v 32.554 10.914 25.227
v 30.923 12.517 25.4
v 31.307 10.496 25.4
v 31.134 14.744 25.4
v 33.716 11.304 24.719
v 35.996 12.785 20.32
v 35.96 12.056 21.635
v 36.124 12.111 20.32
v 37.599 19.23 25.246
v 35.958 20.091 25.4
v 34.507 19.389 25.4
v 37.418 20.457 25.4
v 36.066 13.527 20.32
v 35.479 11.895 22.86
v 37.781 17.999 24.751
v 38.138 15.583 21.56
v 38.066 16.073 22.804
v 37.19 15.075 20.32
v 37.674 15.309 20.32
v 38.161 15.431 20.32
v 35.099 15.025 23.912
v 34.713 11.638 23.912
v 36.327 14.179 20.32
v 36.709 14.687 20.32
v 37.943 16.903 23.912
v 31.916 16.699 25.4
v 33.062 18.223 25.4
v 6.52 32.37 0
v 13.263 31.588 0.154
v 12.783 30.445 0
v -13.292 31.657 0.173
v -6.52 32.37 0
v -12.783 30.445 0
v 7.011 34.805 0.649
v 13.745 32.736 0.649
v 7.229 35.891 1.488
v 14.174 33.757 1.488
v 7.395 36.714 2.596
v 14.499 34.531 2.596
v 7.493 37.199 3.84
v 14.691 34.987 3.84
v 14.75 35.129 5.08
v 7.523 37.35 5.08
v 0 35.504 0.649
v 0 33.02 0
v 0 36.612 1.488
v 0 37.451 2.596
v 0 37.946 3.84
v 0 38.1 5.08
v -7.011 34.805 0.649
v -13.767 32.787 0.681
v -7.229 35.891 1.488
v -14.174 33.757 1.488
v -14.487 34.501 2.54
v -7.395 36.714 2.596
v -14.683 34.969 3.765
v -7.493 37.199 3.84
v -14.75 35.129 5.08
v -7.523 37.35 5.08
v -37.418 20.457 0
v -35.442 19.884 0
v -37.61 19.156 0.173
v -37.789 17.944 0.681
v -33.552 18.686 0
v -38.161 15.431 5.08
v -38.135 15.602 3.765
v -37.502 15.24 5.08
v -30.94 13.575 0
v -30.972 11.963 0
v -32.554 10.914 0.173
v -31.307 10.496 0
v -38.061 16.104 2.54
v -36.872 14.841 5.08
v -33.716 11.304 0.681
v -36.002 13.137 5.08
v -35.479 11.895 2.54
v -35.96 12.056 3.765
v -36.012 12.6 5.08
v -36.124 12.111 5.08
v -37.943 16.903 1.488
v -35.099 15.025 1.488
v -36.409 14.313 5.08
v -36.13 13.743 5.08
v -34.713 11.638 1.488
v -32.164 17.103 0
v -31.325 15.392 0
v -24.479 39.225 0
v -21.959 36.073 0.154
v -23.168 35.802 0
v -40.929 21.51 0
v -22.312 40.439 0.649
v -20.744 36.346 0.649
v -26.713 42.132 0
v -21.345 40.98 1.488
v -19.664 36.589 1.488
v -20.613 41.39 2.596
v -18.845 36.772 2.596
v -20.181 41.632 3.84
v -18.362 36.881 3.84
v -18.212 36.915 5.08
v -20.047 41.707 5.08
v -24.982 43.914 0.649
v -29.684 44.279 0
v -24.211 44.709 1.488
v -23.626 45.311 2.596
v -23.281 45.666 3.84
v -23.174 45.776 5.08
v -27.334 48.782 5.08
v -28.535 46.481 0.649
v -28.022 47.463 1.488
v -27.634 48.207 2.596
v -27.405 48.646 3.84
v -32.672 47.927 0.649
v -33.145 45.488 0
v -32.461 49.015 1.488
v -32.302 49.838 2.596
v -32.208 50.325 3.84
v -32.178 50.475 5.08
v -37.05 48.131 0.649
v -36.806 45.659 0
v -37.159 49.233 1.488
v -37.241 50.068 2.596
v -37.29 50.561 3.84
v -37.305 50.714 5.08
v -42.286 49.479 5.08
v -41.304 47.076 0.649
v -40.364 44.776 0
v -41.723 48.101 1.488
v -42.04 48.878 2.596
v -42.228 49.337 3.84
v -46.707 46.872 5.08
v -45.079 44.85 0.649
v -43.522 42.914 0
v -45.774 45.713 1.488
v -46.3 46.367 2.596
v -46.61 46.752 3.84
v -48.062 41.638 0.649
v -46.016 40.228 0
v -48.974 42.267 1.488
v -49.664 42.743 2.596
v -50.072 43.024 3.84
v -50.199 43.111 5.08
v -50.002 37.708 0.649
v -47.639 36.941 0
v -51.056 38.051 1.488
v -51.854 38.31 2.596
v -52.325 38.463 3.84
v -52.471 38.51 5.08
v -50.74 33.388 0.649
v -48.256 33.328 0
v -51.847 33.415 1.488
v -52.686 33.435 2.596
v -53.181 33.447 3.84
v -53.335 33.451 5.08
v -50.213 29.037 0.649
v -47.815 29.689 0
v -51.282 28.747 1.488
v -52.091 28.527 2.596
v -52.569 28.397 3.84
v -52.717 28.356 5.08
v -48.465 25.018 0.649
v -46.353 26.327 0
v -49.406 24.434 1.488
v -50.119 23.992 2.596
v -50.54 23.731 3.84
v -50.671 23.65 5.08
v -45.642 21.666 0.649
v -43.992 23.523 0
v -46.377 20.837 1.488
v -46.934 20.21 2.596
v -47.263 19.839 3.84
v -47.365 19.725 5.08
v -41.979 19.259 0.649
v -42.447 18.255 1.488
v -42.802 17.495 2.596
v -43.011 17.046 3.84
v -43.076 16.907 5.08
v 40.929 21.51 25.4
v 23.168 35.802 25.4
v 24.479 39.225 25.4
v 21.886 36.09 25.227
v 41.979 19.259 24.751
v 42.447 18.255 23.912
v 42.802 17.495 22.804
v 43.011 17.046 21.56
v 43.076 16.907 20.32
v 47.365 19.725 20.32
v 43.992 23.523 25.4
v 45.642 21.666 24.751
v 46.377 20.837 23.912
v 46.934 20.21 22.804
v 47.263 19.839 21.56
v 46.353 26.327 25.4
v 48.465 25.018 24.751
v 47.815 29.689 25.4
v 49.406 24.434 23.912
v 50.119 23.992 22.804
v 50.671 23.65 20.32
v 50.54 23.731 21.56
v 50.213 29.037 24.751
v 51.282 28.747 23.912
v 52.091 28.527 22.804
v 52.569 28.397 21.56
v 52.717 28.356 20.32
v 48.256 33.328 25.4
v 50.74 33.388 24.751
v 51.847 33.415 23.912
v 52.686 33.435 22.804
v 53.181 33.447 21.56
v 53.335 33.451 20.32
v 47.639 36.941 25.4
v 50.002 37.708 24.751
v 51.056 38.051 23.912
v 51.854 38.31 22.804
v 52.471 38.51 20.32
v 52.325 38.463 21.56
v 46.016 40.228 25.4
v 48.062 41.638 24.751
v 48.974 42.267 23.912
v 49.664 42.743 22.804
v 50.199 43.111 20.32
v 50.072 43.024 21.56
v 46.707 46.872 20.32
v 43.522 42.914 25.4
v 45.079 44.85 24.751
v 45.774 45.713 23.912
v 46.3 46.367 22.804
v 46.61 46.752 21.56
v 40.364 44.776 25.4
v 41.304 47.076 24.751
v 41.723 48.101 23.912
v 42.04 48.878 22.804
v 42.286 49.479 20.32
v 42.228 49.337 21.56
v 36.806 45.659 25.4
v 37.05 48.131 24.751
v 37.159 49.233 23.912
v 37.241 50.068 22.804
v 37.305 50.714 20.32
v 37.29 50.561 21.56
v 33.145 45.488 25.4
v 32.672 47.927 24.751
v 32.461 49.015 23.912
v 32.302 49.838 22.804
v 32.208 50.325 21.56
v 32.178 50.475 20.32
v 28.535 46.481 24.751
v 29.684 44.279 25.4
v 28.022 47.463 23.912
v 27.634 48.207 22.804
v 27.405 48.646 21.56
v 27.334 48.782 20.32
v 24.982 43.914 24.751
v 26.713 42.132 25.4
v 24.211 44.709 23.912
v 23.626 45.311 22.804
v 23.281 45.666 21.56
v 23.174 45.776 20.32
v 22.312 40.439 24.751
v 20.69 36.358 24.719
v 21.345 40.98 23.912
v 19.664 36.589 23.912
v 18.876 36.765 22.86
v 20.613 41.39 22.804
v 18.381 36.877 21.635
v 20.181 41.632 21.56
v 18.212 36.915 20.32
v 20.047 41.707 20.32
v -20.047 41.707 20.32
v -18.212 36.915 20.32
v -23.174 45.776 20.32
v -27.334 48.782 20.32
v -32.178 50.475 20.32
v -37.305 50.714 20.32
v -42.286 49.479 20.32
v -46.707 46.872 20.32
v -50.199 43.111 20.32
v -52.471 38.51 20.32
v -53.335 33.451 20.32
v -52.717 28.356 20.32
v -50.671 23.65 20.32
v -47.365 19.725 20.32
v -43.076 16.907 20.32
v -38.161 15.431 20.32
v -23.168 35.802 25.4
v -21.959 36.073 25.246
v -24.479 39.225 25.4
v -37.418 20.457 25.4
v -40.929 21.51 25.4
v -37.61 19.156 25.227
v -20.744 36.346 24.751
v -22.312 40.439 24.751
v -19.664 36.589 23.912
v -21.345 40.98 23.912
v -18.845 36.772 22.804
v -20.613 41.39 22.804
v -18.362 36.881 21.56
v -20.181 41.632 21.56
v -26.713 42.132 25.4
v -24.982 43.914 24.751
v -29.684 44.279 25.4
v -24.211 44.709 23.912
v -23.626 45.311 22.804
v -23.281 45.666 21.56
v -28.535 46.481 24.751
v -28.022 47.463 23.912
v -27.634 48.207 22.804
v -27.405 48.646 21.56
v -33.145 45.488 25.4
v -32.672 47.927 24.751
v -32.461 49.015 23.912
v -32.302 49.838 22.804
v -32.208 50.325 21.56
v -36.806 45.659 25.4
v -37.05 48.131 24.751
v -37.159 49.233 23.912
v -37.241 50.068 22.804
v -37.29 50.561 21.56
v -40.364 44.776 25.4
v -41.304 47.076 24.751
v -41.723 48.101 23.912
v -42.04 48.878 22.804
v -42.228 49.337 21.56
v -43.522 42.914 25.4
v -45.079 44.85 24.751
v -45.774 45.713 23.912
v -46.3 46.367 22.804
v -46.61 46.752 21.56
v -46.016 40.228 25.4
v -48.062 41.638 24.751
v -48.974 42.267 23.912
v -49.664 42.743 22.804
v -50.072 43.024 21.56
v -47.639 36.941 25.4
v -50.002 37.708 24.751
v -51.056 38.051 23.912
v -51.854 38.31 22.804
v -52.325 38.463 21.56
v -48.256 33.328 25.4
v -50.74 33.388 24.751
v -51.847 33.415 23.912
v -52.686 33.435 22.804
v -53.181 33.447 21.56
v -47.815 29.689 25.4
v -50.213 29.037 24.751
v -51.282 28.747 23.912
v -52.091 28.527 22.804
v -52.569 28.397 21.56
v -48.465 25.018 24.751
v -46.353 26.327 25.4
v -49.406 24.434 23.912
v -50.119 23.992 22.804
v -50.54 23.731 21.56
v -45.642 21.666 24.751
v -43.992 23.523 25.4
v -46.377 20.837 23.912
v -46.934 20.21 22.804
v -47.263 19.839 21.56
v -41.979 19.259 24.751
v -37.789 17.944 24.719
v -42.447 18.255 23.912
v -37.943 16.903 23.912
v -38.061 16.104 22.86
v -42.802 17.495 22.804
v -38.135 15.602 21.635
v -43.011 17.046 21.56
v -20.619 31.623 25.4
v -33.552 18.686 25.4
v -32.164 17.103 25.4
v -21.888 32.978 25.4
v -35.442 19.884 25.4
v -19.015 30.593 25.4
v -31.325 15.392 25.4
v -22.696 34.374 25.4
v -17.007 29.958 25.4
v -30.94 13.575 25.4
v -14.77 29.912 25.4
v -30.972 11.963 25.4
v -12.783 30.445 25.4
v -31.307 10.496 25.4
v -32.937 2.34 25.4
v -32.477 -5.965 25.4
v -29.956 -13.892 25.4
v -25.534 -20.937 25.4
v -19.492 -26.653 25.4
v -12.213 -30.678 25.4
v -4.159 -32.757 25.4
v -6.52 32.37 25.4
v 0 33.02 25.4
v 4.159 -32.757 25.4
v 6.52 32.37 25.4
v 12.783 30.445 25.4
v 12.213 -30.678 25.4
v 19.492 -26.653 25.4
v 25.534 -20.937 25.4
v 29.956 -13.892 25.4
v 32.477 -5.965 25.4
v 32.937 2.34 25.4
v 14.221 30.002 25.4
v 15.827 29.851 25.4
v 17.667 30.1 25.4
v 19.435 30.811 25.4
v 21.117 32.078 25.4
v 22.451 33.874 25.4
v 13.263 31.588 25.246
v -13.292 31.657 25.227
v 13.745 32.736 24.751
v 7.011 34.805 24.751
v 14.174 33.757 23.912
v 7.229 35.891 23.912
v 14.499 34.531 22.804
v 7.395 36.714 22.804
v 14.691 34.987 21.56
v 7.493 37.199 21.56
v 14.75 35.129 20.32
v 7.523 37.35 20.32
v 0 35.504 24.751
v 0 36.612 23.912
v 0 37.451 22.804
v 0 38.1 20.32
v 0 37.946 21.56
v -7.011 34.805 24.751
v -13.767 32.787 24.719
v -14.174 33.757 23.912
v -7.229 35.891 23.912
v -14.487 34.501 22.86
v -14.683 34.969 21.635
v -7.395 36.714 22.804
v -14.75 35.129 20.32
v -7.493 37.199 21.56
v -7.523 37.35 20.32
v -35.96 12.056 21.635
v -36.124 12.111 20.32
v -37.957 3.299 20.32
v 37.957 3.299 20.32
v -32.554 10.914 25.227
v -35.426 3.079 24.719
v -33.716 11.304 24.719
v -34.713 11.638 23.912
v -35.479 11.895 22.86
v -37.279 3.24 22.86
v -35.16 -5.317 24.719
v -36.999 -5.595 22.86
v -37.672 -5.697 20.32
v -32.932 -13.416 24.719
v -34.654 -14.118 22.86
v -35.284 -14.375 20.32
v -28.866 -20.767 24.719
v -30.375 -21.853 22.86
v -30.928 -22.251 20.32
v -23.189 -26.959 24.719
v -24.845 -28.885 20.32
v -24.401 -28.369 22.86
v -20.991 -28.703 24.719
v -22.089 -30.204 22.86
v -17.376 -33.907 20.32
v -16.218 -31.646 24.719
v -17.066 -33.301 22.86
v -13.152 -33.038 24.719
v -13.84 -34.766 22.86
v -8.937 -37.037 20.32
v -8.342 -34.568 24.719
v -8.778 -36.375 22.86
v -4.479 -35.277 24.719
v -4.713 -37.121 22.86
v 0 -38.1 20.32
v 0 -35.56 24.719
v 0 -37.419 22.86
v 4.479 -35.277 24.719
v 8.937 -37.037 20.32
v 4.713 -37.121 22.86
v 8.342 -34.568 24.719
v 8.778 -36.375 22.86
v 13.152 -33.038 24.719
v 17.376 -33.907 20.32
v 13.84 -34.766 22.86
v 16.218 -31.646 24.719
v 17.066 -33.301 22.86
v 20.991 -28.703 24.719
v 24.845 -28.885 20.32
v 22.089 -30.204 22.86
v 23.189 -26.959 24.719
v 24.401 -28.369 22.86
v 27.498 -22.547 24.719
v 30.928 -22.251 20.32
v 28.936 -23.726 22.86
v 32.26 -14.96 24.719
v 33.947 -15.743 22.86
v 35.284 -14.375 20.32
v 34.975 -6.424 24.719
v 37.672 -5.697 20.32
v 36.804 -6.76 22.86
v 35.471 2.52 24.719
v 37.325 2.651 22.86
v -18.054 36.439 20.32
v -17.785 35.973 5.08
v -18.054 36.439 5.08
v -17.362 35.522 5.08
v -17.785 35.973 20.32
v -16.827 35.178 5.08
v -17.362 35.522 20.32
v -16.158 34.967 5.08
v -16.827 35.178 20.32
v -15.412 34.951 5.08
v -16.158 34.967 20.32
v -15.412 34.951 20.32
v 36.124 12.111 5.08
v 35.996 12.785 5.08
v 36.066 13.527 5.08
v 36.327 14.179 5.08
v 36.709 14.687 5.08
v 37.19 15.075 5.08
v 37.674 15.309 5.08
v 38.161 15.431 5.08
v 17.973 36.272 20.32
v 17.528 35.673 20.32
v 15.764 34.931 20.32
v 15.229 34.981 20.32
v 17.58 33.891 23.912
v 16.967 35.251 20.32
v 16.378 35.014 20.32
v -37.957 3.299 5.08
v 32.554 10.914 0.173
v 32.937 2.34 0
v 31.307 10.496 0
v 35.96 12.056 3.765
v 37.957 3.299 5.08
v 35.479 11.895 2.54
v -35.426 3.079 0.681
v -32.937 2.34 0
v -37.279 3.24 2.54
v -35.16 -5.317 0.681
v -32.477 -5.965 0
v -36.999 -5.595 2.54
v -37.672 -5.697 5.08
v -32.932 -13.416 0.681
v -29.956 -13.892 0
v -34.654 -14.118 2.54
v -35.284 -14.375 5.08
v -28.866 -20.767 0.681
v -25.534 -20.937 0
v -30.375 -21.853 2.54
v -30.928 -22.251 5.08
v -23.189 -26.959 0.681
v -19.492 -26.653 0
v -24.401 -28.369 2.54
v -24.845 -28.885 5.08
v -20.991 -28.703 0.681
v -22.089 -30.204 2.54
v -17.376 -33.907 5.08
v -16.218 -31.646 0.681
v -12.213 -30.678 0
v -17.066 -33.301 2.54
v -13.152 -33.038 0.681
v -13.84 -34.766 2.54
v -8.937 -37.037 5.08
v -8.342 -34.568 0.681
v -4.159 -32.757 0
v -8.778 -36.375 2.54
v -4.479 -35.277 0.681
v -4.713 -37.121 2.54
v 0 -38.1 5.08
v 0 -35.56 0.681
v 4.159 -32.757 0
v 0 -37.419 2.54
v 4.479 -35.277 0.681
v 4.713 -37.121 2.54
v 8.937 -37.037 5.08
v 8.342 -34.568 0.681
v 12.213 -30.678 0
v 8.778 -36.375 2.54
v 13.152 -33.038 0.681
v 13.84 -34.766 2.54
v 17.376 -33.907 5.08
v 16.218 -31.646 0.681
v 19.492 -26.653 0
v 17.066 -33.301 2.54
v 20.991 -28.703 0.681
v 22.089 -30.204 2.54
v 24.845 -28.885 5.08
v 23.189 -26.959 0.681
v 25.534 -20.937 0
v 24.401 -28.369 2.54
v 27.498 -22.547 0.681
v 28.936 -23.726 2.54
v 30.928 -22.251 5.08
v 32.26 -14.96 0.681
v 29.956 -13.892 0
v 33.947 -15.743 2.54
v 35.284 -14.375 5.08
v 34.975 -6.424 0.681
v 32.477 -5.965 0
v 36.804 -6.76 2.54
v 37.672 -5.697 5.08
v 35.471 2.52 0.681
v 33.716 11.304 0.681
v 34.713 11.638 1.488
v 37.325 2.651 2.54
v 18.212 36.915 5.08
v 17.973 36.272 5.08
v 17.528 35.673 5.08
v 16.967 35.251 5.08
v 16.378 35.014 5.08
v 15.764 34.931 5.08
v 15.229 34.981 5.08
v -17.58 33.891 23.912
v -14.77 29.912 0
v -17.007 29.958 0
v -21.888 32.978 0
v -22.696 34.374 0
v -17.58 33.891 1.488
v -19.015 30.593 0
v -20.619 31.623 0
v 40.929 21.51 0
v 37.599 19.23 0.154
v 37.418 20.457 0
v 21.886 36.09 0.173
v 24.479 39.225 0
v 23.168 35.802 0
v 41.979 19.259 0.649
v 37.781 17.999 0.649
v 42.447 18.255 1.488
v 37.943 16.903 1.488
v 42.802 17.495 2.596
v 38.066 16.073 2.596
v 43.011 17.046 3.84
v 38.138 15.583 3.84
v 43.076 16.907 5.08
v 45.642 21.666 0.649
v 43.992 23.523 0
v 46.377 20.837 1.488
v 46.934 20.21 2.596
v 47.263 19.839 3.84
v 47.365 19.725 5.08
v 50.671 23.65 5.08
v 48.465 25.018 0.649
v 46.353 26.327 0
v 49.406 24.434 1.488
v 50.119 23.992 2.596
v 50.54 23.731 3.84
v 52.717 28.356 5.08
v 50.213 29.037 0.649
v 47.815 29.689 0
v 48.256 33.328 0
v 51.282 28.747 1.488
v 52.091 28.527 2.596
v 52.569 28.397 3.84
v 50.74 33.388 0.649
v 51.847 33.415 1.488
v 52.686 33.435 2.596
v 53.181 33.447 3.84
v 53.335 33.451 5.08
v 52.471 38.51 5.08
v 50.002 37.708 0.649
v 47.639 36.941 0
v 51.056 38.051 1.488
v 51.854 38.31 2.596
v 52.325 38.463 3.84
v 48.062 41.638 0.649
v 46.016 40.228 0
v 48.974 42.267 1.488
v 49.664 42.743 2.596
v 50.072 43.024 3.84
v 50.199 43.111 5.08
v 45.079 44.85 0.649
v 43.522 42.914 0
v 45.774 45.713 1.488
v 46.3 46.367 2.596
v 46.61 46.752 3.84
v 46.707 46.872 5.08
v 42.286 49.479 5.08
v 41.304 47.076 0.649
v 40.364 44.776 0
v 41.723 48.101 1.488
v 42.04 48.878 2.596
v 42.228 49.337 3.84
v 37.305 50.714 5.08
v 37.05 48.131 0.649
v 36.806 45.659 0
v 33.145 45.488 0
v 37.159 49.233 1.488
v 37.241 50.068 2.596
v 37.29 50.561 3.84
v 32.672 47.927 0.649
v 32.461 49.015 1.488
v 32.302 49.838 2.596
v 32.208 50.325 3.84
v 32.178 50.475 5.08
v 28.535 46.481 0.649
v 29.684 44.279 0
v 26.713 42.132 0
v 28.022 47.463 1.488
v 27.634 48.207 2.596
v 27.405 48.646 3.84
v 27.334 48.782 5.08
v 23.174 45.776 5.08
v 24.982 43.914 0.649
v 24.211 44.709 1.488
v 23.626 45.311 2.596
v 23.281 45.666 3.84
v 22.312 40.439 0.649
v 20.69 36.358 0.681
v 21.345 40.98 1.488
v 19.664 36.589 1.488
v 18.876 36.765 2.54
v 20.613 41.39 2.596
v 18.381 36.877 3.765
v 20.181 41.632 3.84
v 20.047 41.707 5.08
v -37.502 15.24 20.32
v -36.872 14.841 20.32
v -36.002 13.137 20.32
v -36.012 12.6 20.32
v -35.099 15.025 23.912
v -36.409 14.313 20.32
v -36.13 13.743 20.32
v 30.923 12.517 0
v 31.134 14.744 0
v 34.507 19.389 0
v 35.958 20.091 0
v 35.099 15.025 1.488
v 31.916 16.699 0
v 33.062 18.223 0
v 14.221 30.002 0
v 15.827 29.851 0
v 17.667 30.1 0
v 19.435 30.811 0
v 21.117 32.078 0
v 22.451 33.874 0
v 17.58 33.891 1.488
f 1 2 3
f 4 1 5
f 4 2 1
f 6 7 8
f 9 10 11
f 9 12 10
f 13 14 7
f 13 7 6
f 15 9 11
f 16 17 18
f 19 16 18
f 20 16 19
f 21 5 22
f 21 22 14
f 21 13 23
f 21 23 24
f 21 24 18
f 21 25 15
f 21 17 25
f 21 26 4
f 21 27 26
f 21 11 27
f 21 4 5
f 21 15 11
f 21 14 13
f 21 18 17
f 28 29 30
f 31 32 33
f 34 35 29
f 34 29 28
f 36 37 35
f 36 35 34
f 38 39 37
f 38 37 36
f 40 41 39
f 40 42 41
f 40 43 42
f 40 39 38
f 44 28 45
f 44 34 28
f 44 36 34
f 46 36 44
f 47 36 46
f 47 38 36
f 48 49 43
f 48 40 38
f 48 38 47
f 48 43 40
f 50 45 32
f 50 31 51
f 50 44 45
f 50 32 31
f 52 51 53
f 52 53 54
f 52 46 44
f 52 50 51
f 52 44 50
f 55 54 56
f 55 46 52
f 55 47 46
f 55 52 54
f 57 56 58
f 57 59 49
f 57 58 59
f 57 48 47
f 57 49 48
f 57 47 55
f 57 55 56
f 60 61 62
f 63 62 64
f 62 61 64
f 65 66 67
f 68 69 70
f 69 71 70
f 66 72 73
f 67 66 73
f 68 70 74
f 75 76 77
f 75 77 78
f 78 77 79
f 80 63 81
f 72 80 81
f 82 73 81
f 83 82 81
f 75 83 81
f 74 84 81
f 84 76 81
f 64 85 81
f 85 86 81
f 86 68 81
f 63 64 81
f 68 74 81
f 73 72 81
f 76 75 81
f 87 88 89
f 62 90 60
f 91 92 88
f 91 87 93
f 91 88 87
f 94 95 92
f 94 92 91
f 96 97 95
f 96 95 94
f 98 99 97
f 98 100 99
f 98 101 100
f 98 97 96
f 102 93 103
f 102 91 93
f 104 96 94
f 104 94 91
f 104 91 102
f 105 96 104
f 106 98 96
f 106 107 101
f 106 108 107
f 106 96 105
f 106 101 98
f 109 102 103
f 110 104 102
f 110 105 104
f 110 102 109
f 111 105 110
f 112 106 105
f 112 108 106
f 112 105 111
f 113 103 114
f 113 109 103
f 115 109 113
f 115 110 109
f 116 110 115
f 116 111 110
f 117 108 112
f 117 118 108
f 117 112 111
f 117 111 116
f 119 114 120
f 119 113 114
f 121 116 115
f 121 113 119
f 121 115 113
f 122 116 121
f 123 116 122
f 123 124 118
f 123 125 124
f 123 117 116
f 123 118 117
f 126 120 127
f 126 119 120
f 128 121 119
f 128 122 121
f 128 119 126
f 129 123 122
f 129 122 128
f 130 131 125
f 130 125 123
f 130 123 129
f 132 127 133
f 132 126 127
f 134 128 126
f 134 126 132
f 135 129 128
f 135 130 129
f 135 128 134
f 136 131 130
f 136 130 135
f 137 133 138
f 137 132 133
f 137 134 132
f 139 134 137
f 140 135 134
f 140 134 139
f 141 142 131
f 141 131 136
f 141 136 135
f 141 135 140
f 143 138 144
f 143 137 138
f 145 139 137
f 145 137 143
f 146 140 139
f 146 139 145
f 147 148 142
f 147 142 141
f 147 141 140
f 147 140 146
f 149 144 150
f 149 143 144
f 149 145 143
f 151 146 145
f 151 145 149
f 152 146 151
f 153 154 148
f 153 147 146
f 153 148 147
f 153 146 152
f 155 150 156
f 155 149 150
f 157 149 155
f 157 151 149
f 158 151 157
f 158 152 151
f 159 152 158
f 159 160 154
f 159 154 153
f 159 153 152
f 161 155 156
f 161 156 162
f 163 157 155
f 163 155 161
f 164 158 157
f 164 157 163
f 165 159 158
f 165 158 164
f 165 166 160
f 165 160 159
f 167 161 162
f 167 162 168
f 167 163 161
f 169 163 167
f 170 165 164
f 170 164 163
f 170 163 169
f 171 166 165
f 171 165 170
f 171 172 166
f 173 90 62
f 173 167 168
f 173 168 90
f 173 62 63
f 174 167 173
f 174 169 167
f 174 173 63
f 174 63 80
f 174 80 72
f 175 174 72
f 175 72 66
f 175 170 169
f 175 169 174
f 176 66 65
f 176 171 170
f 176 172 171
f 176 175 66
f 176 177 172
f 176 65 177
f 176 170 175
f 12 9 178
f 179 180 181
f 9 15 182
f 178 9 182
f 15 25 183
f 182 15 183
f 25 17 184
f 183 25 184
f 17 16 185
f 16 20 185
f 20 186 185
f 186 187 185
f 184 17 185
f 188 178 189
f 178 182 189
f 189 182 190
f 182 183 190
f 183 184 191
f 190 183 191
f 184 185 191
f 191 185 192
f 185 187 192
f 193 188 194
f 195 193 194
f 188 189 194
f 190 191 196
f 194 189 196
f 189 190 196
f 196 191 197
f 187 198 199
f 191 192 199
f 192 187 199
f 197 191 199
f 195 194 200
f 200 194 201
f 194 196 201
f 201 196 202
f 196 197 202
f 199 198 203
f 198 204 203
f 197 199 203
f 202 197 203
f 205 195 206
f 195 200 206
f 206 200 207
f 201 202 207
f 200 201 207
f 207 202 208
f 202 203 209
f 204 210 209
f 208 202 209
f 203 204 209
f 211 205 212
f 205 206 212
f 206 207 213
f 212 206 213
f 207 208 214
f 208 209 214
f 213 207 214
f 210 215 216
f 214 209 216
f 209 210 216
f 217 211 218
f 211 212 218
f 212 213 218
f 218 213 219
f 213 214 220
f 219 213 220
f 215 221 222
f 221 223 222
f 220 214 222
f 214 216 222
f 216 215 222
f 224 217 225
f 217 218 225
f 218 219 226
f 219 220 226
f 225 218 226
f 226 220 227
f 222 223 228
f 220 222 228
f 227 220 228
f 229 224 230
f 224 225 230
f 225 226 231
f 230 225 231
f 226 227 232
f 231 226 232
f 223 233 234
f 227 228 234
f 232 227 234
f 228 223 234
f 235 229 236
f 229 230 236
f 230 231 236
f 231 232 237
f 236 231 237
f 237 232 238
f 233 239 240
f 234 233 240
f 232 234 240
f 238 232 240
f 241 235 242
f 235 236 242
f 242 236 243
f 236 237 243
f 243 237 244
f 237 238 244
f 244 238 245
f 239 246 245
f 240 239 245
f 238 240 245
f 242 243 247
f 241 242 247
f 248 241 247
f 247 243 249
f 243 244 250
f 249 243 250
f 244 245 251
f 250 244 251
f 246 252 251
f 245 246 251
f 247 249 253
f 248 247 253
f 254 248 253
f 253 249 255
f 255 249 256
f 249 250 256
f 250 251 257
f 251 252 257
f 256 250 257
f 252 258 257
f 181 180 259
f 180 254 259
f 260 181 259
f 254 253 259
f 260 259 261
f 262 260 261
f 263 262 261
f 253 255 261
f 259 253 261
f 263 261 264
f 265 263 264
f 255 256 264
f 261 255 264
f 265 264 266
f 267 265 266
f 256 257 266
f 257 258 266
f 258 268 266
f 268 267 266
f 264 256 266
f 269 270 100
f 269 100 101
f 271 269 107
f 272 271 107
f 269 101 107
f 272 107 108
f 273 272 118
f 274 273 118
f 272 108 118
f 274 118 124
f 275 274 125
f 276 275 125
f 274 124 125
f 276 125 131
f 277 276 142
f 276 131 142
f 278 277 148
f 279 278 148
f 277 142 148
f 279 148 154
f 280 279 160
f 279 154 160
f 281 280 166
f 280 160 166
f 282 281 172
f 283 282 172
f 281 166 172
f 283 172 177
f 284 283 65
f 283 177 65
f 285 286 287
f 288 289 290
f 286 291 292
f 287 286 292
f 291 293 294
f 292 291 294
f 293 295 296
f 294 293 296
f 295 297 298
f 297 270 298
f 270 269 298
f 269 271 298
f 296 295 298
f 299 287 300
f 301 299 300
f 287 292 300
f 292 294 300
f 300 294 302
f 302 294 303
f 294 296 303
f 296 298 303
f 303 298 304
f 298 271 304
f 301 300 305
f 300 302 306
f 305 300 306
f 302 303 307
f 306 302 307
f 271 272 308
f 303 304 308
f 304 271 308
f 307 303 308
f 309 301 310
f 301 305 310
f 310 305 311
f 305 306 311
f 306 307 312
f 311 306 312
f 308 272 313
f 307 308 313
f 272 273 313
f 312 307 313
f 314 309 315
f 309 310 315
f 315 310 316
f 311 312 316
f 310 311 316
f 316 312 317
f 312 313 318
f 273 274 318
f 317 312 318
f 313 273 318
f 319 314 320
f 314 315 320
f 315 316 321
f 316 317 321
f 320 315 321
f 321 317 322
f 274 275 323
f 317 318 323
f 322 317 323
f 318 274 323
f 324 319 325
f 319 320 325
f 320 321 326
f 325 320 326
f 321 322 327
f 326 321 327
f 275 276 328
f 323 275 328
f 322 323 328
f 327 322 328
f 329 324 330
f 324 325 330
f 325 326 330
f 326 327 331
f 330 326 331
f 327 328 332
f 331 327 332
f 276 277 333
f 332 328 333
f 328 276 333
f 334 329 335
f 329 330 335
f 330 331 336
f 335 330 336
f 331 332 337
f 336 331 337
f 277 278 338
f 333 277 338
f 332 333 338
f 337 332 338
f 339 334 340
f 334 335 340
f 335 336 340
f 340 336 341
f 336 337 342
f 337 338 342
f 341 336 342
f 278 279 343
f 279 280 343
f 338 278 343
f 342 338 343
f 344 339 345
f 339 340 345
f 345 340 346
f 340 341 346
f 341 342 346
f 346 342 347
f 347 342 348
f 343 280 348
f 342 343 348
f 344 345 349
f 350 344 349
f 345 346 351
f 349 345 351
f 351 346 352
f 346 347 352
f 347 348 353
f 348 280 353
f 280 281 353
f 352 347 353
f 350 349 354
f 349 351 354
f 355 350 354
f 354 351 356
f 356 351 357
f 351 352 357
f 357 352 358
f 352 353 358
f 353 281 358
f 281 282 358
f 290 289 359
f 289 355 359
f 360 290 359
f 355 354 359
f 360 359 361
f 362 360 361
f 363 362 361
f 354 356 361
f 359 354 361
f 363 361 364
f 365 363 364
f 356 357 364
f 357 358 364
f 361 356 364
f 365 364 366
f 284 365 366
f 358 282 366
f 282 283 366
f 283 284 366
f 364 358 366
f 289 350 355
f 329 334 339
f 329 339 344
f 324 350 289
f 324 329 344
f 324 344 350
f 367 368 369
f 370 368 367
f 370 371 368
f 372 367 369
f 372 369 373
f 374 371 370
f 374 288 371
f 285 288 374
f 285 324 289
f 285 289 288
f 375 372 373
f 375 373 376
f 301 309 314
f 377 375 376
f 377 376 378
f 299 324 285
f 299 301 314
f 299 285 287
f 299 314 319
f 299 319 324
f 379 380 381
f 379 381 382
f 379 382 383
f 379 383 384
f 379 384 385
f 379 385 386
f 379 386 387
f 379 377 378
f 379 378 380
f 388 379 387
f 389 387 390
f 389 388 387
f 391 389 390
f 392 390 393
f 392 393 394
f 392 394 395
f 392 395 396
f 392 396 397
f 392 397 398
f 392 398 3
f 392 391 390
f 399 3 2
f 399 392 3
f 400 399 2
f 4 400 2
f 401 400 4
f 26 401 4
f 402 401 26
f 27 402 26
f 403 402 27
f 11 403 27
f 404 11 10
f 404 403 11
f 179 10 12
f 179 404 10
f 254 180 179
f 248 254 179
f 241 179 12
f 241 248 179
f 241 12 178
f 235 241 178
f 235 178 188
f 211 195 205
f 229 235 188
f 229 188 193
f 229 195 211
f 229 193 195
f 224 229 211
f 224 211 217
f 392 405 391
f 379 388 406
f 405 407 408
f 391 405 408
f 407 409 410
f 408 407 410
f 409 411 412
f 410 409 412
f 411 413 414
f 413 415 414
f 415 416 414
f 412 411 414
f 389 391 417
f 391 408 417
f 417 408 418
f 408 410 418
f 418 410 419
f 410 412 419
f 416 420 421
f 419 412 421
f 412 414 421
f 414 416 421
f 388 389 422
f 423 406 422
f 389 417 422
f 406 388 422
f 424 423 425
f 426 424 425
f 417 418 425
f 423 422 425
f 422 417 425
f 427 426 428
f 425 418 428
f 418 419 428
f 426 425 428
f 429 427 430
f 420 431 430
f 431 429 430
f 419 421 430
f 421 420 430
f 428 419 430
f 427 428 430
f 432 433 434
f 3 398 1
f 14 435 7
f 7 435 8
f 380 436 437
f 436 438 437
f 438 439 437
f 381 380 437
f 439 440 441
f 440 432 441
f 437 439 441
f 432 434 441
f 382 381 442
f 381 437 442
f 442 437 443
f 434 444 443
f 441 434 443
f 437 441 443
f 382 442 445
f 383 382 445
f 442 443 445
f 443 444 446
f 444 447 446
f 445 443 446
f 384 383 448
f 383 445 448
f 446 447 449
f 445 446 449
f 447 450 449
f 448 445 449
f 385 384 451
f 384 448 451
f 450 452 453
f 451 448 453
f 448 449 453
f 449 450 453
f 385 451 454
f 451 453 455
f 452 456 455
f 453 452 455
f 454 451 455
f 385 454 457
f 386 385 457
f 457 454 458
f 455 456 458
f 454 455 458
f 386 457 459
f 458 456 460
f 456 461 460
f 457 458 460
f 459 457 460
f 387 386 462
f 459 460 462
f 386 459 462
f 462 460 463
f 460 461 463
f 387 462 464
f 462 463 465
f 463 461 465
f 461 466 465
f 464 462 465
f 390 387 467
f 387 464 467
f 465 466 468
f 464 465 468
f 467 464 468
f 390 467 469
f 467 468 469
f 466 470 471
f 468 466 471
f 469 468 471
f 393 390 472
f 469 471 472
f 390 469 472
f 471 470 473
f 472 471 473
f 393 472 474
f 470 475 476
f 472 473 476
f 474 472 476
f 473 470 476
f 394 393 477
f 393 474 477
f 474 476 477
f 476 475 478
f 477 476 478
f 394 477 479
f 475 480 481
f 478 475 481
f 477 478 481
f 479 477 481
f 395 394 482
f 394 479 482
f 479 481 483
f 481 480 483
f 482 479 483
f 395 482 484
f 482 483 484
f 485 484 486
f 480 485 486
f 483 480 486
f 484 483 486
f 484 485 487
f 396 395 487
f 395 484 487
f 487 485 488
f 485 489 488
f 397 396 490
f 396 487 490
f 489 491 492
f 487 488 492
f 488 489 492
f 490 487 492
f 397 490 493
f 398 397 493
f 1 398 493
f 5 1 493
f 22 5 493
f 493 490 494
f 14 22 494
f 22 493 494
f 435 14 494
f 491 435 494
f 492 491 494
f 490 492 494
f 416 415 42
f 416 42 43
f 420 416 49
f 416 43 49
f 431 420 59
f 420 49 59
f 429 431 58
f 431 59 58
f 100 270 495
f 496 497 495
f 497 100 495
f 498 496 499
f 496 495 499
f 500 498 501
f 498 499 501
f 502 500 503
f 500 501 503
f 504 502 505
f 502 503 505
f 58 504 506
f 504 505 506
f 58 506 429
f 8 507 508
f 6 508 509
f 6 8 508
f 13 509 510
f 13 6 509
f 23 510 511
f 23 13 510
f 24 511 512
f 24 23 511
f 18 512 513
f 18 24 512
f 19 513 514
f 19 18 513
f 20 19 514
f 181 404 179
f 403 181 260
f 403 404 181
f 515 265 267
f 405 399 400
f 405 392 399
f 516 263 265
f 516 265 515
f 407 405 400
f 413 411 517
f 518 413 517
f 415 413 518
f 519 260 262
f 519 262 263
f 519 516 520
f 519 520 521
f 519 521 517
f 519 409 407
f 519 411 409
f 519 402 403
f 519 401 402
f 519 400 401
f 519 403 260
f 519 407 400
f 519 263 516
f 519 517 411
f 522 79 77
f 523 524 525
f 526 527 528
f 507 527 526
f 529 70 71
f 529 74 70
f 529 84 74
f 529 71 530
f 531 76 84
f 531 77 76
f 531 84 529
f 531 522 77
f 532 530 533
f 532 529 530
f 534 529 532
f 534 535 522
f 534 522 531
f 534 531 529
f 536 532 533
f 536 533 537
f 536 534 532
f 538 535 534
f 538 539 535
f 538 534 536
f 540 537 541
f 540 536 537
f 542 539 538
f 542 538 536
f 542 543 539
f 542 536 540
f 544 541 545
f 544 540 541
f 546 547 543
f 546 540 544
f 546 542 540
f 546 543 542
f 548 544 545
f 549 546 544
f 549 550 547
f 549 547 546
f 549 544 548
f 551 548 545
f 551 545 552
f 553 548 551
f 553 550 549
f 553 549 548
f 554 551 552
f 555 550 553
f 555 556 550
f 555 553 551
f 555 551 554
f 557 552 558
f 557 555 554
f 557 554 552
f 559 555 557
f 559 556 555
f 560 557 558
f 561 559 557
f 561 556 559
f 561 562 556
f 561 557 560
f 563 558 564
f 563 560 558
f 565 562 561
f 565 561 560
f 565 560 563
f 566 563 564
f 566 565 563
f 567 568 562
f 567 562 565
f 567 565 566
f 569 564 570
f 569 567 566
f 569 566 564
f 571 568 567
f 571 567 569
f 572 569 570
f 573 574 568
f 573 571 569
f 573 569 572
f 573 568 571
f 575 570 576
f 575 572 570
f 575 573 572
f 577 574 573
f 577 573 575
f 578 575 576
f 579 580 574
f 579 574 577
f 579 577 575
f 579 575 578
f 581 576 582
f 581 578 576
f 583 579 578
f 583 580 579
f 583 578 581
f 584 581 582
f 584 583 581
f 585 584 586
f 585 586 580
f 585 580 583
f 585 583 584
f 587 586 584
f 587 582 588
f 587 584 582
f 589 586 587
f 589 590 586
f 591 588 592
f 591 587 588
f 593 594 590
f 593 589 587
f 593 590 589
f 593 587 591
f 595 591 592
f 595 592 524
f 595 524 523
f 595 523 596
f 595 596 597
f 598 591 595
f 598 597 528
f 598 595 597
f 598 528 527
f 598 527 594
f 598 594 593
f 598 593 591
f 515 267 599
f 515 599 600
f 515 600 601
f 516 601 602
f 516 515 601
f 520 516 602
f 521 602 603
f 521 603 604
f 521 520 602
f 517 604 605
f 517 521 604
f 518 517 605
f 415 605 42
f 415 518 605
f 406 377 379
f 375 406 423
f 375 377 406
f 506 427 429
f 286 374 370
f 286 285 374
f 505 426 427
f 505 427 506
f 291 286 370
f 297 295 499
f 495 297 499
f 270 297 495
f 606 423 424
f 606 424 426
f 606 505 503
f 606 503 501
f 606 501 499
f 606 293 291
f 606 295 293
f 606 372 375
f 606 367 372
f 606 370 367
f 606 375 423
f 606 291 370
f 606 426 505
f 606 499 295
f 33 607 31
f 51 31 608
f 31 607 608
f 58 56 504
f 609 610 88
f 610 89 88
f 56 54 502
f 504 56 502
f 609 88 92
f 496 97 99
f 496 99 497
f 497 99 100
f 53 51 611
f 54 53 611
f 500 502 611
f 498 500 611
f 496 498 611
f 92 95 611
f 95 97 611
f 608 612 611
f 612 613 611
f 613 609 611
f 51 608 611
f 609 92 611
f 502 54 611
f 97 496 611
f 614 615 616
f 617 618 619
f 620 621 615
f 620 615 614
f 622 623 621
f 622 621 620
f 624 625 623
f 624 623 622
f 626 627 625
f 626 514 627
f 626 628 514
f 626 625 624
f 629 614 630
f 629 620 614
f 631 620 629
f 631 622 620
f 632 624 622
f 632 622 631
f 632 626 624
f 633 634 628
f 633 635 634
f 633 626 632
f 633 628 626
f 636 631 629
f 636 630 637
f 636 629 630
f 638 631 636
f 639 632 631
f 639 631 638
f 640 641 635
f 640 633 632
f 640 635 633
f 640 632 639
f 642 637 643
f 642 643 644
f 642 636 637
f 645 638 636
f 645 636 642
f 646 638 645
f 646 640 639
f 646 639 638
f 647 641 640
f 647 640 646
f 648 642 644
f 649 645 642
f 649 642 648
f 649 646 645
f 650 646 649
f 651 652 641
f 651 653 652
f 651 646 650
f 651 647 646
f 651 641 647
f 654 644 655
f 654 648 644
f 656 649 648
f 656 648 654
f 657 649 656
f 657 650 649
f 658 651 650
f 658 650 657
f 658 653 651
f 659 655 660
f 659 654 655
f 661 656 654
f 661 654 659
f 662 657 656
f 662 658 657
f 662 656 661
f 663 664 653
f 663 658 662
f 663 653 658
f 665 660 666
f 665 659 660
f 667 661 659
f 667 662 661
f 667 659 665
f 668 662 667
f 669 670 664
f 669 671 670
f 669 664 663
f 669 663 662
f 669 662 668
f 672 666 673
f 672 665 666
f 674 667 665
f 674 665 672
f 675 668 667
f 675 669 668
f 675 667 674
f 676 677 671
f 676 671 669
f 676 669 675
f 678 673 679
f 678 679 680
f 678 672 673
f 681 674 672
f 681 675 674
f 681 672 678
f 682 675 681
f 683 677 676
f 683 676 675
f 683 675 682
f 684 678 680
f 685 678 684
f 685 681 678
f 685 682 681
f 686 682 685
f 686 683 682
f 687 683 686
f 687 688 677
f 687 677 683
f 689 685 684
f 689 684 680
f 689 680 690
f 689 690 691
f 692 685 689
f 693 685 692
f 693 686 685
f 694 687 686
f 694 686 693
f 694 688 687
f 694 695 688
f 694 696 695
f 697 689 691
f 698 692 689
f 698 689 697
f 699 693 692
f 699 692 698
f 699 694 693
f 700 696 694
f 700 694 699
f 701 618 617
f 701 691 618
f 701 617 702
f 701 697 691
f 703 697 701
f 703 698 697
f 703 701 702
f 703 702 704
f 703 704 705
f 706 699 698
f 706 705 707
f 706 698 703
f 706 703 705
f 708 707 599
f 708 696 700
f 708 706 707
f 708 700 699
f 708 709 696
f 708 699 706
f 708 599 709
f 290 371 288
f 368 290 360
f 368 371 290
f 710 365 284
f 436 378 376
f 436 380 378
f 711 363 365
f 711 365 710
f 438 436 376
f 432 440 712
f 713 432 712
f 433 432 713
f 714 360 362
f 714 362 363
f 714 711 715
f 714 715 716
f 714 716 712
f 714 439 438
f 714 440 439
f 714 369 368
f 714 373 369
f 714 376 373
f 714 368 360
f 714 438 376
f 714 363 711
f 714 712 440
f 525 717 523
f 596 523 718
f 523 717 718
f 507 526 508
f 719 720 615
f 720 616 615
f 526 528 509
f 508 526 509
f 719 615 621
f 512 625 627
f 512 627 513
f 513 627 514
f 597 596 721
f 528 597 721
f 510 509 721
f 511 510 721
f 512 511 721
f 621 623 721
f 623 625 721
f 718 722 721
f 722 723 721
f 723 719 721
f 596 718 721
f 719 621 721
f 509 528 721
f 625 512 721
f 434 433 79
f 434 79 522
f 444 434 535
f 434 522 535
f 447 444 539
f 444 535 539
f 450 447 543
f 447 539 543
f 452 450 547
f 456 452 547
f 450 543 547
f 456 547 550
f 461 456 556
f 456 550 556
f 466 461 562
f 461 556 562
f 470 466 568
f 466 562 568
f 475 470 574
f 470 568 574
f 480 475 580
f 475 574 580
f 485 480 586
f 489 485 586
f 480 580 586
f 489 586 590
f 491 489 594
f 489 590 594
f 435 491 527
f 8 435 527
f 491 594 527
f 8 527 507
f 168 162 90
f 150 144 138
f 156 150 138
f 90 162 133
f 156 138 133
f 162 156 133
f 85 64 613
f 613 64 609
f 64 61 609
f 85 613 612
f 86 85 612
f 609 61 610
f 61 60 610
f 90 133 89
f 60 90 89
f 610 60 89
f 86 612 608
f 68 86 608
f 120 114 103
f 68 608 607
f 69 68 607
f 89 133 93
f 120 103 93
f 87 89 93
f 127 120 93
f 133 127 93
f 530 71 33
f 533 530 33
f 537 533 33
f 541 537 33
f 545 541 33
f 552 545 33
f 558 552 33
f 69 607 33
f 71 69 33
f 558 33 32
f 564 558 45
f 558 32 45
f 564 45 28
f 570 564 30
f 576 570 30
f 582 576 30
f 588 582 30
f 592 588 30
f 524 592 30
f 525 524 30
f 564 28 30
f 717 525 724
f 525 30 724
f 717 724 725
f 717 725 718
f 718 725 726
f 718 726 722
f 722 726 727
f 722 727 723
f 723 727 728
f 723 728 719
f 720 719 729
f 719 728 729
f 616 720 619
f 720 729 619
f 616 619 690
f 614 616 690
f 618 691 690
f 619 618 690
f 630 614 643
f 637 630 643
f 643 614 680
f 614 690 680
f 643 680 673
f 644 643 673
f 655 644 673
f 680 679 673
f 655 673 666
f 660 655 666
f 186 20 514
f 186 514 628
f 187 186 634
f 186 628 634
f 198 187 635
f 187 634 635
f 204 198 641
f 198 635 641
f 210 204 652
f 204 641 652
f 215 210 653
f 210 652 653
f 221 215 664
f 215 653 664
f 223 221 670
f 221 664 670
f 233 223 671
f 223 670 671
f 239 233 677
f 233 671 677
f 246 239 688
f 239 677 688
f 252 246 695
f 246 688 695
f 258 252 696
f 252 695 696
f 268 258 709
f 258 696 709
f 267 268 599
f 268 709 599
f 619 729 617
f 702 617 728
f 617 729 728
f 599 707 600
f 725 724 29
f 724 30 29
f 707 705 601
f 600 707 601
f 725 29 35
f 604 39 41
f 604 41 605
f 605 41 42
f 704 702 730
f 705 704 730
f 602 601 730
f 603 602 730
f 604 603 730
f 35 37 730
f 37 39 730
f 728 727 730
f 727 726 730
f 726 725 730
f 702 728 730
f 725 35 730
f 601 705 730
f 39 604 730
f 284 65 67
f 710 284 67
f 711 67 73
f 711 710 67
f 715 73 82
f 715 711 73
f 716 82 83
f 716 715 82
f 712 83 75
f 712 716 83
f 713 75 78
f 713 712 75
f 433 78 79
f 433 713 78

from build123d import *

# Parameters (mm, degrees)
F1_DEPTH = 25.4
F2_R     = 2.54
F3_R     = 5.08


with BuildPart() as f1:
    # F0 (on Top) → F1 (new body)
    with BuildSketch(Plane.XY):
        with BuildLine():
            ThreePointArc((-17.792637, 33.690237), (-48.589068, 45.118421), (-34.914103, 15.251736))
            ThreePointArc((-34.914103, 15.251736), (0, -38.1), (34.914103, 15.251736))
            ThreePointArc((34.914103, 15.251736), (48.589068, 45.118421), (17.792637, 33.690237))
            ThreePointArc((17.792637, 33.690237), (0, 38.1), (-17.792637, 33.690237))
        make_face()
    extrude(amount=F1_DEPTH)

    # F2
    f2_edges = [f1.edges().sort_by_distance(p)[0] for p in [
        (-34.914103, 15.251736, 12.7),
        (-17.792637, 33.690237, 12.7),
        (17.792637, 33.690237, 12.7),
        (34.914103, 15.251736, 12.7),
    ]]
    fillet(f2_edges, radius=F2_R)

    # F3
    f3_edges = [f1.edges().sort_by_distance(p)[0] for p in [
        (0, -38.1, 25.4),
        (0, -38.1, 0),
    ]]
    fillet(f3_edges, radius=F3_R)


solid = f1.part
